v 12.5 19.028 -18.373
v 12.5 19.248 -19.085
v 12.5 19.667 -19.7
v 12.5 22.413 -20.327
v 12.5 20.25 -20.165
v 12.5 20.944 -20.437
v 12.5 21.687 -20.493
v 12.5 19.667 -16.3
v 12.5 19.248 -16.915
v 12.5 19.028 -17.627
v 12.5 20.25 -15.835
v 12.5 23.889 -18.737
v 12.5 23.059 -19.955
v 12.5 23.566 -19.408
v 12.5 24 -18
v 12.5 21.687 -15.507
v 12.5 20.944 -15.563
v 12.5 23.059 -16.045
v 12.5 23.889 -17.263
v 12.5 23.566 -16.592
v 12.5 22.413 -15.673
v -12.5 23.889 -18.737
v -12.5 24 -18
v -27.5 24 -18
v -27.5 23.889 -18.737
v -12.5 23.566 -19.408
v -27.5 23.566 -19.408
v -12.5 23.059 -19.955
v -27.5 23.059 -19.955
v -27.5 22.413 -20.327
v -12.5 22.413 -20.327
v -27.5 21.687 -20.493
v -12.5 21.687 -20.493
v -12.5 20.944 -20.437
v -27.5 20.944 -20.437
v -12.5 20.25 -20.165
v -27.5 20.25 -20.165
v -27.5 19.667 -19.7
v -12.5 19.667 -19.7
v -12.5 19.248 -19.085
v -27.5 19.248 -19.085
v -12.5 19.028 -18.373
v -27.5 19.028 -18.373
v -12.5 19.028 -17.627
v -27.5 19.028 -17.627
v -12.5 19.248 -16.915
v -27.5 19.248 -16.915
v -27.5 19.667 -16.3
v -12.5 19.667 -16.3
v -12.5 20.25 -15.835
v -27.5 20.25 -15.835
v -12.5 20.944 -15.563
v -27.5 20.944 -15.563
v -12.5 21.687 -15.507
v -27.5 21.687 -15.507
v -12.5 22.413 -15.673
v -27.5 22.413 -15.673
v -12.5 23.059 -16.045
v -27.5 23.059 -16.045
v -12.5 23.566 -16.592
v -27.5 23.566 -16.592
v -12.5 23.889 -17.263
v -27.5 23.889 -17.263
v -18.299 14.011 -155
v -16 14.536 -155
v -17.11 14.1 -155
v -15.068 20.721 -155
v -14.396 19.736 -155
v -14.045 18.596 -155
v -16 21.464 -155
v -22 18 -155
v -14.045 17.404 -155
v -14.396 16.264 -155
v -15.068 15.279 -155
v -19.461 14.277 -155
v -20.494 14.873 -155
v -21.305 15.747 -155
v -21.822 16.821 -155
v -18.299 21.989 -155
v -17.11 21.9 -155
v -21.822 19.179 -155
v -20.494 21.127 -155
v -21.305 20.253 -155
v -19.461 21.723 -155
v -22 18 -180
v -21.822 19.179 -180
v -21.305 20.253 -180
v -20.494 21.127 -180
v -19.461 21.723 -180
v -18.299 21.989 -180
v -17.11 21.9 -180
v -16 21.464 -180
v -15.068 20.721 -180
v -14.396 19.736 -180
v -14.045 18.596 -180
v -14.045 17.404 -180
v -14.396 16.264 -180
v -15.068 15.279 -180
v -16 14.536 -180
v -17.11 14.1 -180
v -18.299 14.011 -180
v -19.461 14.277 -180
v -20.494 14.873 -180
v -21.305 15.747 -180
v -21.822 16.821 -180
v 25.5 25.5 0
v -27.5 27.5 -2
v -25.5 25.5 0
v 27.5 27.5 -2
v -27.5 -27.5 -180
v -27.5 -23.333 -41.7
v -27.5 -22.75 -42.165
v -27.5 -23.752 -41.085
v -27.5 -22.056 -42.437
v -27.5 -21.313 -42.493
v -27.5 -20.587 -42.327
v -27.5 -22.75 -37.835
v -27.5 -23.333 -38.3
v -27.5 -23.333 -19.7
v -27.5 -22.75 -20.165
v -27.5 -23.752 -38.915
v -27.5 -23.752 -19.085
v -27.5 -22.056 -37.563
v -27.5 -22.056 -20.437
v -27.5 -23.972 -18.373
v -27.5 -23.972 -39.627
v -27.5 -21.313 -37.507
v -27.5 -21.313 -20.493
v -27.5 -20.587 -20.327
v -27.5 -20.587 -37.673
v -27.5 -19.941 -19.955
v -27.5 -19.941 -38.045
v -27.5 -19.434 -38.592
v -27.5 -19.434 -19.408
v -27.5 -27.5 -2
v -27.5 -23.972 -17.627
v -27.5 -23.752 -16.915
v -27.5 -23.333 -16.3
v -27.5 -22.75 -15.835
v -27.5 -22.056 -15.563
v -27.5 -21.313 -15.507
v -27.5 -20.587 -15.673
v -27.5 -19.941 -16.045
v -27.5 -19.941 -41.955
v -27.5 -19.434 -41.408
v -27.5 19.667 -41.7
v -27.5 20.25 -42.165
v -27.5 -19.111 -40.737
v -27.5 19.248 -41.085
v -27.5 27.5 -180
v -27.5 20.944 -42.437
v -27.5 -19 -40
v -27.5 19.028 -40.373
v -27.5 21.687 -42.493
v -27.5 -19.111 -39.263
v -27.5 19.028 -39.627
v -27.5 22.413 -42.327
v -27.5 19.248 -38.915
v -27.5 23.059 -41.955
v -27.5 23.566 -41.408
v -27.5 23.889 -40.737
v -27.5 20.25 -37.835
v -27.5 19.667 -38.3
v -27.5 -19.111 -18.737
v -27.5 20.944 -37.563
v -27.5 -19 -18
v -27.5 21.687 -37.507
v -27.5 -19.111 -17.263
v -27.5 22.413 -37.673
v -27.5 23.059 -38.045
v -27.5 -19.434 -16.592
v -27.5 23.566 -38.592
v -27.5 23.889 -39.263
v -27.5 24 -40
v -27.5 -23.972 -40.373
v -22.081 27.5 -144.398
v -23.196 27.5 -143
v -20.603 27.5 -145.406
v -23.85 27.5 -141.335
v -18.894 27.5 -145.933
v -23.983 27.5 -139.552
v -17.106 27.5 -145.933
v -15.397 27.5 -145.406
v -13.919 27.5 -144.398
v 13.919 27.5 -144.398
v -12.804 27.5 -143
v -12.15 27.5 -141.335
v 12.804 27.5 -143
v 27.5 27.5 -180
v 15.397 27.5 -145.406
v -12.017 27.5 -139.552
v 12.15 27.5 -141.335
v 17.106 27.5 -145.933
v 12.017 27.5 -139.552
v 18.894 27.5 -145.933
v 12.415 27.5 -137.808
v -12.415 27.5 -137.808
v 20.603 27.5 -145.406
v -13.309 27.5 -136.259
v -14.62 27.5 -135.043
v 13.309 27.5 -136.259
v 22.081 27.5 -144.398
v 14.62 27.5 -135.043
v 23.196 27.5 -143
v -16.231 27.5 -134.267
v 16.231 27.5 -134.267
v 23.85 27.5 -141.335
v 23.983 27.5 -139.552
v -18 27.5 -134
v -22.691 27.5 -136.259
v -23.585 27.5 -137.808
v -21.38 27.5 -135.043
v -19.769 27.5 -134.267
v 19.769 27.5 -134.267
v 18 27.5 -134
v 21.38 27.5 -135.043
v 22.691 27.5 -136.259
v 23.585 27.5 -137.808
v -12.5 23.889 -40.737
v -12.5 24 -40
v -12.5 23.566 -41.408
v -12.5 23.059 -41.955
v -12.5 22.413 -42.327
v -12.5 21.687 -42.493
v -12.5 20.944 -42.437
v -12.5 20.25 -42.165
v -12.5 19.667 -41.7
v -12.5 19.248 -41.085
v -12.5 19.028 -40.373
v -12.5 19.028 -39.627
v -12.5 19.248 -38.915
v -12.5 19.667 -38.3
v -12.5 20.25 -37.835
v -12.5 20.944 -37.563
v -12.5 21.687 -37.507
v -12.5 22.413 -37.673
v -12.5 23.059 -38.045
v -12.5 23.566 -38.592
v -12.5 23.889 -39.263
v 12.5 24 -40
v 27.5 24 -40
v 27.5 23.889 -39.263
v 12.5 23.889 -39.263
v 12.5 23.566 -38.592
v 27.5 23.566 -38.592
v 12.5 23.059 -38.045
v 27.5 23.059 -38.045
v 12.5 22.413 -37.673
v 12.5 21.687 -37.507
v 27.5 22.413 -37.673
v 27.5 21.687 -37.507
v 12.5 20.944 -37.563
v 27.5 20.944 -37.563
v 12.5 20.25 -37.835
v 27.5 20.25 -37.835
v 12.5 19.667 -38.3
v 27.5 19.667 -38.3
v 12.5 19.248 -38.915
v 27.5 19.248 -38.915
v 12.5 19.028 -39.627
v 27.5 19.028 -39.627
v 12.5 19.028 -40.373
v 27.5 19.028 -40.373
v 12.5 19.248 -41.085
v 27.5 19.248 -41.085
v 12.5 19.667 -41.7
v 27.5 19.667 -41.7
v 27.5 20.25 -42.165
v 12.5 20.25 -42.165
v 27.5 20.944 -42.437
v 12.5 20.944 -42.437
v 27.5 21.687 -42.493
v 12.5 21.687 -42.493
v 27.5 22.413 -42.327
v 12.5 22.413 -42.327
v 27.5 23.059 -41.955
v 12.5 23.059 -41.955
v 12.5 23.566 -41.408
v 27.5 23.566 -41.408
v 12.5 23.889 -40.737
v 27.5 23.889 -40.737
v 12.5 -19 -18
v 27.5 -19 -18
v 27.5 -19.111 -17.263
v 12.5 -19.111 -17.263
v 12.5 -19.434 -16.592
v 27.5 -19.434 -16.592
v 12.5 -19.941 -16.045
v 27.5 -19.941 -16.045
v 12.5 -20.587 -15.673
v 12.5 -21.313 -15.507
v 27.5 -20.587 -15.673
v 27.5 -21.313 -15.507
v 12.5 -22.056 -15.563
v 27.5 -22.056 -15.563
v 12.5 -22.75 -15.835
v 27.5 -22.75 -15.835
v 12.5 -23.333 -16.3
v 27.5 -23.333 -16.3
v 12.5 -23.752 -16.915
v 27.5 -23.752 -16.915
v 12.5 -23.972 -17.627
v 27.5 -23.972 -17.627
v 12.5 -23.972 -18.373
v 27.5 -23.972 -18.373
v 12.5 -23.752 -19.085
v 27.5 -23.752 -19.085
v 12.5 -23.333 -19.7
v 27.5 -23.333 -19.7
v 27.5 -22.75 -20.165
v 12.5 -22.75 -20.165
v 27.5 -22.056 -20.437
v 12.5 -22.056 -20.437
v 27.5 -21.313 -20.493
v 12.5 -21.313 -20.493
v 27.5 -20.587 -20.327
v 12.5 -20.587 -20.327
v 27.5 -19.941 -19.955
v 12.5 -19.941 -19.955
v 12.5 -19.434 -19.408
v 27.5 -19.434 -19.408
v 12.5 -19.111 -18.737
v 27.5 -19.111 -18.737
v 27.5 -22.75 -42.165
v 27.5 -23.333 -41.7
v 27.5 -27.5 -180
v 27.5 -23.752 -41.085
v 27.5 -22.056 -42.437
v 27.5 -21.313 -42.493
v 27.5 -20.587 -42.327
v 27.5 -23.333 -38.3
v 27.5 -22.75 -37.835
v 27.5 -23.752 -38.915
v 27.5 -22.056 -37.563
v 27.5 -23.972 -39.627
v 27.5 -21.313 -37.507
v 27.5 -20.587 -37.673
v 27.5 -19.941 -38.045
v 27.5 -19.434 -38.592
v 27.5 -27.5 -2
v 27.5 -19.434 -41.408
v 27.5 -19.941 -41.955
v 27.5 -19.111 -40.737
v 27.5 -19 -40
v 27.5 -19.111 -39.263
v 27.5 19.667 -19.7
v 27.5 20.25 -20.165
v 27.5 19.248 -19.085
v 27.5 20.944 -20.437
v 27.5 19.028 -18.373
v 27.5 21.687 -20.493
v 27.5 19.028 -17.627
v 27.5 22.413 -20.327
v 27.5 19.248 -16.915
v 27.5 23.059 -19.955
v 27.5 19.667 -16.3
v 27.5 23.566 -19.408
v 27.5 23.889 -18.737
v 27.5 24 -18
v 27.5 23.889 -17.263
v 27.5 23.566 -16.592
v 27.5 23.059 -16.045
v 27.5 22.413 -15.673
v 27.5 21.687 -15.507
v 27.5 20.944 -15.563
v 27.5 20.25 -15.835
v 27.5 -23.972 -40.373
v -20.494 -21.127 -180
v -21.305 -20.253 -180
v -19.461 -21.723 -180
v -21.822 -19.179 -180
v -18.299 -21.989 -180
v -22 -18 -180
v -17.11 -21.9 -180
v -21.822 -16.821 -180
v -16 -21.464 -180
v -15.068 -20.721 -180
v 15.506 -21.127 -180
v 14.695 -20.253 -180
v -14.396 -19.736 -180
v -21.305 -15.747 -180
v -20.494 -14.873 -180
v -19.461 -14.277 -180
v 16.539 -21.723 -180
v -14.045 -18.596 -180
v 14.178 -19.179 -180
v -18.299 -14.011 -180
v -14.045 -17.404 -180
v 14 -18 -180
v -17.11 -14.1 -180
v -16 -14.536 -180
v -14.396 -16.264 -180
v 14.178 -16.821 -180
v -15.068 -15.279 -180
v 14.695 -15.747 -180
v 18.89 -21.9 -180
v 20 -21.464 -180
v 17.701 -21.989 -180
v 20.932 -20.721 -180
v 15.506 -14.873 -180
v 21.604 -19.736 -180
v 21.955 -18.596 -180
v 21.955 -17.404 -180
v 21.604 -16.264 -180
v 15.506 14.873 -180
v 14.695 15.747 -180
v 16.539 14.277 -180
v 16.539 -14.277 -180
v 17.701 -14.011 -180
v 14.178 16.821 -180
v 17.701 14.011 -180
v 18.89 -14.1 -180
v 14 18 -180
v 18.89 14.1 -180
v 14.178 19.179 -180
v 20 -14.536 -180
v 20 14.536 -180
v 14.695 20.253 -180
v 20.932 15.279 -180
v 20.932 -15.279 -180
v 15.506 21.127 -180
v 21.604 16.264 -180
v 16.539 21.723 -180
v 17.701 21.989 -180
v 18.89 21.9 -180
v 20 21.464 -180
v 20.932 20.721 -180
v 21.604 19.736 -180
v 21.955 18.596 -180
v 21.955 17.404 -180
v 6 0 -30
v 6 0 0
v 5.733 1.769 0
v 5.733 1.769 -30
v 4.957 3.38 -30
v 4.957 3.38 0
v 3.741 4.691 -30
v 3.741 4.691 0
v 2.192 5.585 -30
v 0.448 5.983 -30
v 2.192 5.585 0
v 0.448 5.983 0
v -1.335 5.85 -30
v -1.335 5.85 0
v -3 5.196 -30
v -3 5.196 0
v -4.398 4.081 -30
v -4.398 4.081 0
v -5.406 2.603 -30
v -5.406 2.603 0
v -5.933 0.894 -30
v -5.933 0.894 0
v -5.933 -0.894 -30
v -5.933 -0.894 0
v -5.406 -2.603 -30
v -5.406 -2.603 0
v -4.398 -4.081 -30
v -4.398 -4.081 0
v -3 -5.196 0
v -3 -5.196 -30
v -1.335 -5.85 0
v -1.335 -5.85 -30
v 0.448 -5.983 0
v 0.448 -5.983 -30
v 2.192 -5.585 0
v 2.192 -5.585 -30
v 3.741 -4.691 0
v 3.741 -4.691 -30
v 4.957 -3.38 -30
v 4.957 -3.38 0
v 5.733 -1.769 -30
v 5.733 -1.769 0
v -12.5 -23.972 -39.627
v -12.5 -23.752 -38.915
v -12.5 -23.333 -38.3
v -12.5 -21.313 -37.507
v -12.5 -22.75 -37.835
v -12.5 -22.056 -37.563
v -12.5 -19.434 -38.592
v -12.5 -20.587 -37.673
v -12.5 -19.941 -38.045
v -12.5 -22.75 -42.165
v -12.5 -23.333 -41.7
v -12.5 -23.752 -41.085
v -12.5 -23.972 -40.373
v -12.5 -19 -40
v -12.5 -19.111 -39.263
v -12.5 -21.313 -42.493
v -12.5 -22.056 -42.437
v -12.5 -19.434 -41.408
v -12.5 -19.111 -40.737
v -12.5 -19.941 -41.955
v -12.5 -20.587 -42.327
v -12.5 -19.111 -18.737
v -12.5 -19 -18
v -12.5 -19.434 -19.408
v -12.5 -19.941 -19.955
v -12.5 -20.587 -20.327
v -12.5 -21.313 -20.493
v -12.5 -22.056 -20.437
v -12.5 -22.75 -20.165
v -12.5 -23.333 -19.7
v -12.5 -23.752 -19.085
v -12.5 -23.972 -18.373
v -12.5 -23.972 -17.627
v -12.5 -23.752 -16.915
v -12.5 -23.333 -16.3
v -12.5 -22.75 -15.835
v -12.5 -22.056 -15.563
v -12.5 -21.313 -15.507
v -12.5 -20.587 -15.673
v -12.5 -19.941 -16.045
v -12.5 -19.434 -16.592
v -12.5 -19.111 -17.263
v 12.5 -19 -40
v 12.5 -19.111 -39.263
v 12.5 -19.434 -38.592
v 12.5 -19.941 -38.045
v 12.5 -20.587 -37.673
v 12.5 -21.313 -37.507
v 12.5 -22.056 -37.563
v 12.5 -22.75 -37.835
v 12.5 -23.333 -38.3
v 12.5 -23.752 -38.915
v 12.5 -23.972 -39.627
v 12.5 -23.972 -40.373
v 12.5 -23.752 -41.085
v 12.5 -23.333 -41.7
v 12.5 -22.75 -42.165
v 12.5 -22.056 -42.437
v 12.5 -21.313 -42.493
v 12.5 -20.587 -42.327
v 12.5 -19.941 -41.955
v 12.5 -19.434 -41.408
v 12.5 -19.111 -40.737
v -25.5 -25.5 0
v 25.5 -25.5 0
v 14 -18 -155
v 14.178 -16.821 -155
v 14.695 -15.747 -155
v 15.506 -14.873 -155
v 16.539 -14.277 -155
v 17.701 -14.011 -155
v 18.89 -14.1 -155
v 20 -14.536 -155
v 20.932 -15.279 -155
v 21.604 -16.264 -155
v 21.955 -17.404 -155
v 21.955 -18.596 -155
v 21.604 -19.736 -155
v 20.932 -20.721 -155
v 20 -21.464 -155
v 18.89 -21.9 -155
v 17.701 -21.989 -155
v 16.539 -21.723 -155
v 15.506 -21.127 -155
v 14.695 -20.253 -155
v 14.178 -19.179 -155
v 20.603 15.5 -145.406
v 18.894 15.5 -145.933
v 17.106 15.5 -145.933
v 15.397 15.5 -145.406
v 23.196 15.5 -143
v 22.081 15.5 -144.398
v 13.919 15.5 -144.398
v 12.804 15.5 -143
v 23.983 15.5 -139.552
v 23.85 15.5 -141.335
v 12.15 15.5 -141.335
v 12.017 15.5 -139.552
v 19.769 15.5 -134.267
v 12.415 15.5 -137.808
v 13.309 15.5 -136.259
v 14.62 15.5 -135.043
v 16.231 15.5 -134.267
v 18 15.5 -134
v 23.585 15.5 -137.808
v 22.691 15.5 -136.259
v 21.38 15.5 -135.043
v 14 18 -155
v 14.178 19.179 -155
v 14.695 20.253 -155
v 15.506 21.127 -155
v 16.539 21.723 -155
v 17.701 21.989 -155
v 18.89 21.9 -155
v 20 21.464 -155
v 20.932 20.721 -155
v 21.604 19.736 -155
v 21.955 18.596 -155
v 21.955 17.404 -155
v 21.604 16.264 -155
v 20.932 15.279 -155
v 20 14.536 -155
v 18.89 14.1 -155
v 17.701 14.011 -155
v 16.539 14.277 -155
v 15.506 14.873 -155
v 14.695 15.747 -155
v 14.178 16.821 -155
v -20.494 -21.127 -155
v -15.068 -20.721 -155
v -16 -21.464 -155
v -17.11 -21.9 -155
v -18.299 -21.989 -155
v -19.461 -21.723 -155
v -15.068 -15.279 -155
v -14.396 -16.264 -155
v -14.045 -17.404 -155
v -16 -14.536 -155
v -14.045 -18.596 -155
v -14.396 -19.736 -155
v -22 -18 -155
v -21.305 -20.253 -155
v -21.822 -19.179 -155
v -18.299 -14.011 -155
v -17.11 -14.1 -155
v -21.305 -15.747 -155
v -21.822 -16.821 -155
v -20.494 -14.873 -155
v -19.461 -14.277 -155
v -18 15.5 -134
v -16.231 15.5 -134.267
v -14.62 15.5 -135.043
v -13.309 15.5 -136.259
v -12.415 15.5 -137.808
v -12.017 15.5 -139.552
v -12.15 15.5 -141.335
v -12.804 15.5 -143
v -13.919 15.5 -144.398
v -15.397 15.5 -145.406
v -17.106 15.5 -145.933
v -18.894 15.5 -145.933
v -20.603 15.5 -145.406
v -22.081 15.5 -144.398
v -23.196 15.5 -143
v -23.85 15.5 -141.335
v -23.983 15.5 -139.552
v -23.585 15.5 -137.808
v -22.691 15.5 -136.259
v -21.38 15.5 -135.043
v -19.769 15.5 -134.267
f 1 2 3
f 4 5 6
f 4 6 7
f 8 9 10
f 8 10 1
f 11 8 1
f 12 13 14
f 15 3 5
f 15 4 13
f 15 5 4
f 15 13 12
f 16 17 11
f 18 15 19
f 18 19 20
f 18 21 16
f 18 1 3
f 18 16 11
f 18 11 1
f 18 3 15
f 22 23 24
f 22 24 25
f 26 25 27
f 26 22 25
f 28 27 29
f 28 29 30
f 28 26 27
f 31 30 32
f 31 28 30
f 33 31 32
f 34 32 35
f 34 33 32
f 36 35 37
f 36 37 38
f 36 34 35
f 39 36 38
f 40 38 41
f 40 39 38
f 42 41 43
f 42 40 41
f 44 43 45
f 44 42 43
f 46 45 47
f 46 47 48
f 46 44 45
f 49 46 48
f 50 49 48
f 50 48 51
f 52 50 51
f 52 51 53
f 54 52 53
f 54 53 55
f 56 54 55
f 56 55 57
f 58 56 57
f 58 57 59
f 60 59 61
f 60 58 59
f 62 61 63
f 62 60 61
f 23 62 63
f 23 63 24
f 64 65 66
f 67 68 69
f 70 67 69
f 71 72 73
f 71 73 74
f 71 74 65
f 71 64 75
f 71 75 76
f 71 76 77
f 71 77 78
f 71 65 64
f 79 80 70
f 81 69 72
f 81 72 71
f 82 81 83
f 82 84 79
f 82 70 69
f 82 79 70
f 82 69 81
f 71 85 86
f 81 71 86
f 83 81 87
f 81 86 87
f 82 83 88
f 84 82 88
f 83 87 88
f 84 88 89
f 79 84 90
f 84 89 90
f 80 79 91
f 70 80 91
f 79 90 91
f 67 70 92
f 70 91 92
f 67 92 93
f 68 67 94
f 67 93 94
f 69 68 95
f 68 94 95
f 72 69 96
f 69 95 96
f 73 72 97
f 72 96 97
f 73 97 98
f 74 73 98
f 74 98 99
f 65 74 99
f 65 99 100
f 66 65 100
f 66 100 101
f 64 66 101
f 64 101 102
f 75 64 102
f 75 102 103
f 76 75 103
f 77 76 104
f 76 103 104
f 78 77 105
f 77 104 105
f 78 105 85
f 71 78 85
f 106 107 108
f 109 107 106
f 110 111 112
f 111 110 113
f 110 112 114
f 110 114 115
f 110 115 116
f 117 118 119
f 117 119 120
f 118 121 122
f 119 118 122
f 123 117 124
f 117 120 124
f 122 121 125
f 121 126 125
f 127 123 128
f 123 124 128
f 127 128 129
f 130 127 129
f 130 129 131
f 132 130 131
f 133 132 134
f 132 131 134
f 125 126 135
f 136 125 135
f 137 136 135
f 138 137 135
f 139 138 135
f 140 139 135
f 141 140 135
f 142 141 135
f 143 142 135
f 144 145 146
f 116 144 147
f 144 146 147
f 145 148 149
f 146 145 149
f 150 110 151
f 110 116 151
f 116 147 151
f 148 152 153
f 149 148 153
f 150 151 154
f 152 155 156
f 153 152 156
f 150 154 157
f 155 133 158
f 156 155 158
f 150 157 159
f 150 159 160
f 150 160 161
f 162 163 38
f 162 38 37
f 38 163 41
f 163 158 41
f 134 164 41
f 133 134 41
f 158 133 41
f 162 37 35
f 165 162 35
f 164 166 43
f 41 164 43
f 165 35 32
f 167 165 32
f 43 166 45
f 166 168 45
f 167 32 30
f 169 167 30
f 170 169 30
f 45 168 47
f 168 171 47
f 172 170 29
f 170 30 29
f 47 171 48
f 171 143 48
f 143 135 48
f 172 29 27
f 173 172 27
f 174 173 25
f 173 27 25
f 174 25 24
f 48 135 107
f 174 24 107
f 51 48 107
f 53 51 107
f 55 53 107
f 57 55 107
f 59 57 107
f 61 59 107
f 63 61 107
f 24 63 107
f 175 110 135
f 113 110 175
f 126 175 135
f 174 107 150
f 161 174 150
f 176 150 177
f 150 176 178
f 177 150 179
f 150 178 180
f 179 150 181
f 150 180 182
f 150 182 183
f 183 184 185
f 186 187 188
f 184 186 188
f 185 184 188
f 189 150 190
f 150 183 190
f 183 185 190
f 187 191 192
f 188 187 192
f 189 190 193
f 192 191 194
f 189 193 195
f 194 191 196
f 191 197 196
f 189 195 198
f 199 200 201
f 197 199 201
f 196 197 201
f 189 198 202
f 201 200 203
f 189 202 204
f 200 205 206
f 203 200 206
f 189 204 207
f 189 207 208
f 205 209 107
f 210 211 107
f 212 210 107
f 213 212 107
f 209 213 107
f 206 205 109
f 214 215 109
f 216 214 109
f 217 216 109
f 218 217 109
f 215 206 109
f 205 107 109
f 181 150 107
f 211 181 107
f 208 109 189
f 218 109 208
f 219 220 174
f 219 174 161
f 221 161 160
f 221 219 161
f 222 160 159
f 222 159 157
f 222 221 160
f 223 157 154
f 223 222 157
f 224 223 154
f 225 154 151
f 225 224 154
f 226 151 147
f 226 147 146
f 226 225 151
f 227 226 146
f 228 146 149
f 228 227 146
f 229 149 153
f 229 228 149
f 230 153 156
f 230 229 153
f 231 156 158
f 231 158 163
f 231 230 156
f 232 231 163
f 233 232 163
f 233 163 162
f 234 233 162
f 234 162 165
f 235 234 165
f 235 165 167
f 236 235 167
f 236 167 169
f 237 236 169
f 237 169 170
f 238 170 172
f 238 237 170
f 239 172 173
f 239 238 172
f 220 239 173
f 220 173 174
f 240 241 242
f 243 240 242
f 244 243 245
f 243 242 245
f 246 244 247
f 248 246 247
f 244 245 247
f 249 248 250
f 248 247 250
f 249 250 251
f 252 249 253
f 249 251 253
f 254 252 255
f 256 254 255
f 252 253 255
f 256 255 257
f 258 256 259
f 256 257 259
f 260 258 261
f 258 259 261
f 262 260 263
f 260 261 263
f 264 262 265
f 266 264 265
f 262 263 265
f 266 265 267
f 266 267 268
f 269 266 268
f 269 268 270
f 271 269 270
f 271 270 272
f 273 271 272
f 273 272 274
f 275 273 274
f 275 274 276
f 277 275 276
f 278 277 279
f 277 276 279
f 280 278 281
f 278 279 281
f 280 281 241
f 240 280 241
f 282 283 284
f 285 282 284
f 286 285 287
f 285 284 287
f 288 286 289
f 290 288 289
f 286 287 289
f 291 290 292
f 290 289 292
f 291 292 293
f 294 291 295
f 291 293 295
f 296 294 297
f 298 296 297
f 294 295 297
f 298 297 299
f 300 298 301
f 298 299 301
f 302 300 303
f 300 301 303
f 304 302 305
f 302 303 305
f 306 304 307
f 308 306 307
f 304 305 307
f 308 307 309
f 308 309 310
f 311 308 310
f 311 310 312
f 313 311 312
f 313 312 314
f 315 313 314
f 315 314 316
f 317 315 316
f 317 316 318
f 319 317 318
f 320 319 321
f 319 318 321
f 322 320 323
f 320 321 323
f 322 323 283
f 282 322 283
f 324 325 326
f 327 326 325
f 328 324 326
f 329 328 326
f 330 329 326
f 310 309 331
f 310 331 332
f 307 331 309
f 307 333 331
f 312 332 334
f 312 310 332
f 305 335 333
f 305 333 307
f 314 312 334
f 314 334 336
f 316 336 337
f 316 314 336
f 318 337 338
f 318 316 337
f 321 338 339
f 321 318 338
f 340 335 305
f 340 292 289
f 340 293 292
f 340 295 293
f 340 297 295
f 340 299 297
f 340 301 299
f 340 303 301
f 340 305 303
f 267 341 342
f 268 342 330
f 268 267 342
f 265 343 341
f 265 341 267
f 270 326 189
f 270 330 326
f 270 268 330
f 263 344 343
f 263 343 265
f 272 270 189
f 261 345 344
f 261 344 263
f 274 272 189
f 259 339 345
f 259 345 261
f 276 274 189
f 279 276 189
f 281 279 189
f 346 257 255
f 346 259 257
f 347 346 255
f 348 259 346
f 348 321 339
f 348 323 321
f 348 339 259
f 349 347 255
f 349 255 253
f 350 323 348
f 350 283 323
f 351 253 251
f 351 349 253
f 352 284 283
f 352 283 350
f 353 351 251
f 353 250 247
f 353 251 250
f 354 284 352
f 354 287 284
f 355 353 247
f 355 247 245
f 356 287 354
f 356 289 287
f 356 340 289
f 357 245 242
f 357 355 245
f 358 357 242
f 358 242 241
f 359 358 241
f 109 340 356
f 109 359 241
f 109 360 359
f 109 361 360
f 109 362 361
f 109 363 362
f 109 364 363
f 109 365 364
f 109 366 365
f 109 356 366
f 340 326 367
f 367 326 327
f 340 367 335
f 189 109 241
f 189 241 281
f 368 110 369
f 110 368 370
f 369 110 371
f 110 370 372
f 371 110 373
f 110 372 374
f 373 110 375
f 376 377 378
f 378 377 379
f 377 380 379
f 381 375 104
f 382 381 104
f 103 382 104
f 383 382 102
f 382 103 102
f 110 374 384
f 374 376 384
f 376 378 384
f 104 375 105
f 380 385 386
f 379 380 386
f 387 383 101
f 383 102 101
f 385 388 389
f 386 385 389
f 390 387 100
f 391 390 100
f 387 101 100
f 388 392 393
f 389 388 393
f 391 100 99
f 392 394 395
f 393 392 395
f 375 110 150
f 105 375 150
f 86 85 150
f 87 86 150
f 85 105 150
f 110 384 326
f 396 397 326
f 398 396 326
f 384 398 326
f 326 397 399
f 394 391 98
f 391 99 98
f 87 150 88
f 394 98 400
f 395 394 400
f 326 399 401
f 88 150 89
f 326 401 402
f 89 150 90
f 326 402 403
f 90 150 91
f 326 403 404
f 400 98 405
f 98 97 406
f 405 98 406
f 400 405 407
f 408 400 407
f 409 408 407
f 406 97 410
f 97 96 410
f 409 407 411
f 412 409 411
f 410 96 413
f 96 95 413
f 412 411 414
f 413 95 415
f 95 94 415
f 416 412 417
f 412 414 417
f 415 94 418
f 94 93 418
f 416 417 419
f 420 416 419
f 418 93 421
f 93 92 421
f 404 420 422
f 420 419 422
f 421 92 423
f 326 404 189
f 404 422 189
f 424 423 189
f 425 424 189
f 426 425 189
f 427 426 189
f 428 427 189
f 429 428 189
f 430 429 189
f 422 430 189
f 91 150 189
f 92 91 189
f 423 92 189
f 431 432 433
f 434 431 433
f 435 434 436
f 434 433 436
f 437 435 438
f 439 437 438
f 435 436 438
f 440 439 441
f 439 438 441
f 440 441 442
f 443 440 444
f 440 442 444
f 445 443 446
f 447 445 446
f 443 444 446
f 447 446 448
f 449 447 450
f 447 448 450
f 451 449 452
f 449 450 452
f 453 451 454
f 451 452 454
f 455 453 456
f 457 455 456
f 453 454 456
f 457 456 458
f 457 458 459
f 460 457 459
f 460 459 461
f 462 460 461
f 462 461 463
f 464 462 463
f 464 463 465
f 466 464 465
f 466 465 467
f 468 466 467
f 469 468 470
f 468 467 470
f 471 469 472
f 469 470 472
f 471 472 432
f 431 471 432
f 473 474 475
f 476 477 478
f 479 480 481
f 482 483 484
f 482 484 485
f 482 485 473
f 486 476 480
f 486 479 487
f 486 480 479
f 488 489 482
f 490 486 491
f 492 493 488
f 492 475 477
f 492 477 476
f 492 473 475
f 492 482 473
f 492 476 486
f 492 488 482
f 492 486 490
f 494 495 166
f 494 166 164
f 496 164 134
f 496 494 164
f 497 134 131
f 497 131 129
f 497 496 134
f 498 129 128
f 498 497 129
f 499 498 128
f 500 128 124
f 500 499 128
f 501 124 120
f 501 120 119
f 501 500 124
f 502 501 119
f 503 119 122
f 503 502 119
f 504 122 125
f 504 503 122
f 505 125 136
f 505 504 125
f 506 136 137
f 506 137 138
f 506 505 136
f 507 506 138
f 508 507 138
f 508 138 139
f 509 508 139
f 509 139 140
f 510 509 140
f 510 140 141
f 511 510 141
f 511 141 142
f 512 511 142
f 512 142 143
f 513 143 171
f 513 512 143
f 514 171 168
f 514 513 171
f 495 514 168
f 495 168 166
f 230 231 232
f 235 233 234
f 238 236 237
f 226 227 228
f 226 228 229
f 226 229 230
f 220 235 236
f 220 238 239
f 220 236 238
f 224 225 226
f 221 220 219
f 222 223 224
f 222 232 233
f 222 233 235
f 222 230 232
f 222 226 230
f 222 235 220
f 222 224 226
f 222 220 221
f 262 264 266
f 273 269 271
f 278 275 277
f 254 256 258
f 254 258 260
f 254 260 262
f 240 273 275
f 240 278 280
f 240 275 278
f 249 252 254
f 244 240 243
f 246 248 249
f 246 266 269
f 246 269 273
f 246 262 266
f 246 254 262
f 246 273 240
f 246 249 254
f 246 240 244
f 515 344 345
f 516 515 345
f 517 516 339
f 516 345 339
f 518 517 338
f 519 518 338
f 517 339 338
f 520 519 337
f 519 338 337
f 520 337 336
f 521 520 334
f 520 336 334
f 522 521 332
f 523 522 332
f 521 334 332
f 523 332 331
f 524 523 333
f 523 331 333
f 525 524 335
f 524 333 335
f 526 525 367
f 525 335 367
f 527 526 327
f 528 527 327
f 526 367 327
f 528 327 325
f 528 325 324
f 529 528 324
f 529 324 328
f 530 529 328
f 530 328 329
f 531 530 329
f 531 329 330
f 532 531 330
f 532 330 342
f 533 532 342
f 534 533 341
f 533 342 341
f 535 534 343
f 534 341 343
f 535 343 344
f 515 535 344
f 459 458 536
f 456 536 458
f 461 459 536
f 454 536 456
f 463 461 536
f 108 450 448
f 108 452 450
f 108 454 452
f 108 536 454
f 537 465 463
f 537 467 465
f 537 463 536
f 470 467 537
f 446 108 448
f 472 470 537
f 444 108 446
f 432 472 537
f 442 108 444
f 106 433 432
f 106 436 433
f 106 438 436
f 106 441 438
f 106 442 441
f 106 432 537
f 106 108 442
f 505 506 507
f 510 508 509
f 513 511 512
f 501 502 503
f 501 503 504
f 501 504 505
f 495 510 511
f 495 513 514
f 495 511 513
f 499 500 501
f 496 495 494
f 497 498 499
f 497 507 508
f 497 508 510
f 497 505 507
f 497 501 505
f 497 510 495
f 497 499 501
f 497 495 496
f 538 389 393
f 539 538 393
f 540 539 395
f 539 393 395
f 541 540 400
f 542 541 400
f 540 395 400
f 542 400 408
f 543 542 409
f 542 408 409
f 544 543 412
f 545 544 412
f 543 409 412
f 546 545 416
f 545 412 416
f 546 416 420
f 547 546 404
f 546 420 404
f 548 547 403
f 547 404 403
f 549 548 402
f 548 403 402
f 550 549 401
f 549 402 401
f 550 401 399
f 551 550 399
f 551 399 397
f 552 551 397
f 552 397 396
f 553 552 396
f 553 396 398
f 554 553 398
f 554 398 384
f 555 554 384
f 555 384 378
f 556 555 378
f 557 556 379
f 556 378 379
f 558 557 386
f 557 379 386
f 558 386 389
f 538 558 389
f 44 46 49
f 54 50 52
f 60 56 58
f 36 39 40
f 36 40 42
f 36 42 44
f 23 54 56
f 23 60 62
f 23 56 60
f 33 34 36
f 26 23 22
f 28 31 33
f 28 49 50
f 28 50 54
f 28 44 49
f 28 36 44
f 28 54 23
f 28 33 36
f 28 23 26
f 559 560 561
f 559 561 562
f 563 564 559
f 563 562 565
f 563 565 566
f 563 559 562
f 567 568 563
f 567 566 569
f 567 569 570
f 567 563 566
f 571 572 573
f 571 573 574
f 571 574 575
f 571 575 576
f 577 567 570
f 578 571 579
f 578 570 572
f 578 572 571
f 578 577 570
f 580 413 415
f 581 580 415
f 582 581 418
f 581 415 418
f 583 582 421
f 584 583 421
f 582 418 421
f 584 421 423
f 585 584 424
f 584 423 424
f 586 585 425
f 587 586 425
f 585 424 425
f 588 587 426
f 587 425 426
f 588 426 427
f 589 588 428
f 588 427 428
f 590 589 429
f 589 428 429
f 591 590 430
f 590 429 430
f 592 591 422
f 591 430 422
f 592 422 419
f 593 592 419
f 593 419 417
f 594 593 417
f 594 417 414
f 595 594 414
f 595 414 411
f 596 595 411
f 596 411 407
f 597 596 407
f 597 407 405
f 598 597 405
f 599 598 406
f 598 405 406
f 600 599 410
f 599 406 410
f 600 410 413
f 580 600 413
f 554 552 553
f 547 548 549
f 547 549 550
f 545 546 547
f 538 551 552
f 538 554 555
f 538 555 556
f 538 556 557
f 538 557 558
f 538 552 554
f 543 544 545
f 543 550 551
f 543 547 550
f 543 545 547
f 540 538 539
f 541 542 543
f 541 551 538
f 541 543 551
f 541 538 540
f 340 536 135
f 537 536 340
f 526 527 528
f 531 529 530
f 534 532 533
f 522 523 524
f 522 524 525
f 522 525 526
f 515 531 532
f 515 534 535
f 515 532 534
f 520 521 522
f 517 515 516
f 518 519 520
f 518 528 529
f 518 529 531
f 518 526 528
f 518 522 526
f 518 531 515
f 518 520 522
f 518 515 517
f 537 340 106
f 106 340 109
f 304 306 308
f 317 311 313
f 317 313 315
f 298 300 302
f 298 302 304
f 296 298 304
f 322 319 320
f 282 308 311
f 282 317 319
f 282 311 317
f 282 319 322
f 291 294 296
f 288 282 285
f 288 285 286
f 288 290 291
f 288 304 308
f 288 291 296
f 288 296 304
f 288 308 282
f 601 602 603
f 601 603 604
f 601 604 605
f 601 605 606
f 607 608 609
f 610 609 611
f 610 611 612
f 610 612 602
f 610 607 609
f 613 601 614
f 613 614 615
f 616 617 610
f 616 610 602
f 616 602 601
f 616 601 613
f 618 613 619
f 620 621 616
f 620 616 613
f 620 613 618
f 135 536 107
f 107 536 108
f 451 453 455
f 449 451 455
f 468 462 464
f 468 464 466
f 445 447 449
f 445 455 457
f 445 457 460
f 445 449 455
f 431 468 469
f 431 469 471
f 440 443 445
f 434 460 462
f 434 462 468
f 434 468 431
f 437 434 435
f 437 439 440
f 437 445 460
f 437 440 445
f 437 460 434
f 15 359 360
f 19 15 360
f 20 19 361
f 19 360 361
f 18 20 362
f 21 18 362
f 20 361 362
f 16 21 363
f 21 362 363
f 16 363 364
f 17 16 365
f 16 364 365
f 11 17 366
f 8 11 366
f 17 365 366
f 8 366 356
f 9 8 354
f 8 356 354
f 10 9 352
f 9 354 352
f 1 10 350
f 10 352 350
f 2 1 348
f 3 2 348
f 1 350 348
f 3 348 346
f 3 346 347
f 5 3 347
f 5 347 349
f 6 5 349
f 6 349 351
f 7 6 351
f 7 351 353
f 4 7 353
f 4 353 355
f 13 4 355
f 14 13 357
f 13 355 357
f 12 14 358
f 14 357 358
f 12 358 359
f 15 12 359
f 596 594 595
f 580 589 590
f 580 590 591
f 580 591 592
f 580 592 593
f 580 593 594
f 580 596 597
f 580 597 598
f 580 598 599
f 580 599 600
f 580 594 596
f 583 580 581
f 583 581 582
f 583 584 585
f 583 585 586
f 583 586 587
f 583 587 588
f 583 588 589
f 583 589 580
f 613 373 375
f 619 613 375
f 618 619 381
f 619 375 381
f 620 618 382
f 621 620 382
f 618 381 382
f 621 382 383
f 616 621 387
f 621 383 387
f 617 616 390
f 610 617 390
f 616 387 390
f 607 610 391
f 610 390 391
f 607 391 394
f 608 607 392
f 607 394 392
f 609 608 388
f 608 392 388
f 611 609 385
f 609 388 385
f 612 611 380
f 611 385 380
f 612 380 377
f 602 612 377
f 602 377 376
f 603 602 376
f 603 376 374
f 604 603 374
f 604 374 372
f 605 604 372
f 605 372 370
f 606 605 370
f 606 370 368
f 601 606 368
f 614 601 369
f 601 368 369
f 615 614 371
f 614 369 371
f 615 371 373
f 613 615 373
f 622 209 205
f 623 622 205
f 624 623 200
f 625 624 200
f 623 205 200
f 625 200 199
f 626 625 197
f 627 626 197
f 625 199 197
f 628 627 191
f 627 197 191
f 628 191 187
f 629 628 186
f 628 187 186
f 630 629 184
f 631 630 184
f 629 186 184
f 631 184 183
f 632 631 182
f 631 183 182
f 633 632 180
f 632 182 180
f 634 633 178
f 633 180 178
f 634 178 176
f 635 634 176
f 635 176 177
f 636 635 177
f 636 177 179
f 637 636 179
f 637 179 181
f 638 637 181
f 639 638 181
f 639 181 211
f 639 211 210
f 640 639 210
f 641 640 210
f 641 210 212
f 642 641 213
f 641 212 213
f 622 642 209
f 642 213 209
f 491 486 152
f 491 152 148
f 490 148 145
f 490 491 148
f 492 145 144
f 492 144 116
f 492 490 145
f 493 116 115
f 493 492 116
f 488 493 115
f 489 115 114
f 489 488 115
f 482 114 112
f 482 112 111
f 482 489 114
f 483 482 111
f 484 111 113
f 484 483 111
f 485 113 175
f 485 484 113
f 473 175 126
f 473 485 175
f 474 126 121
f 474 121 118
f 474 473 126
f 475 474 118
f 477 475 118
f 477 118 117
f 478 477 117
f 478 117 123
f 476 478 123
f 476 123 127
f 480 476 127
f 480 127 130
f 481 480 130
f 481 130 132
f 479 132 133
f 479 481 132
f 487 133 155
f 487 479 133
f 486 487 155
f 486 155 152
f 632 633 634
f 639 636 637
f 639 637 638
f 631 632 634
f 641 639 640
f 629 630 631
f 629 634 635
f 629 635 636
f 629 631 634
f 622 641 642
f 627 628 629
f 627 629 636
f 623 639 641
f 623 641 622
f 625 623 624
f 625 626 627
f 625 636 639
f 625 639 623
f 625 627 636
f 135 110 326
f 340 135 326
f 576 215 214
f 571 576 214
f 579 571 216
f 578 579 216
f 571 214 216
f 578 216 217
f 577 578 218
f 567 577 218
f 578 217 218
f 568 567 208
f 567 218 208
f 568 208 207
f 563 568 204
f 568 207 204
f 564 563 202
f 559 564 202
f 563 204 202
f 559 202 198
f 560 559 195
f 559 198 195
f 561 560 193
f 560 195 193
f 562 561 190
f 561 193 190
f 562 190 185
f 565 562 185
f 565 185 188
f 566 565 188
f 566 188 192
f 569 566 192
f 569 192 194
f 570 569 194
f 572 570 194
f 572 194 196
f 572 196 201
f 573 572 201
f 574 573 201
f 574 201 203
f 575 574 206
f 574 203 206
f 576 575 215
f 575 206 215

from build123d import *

# Parameters (mm, degrees)
CROQUIS1_W              = 55
CROQUIS1_H              = 55
SALIENTE_EXTRUIR1_DEPTH = 180
CROQUIS2_R              = 6
CORTAR_EXTRUIR1_DEPTH   = 30
CROQUIS3_R              = 4
CORTAR_EXTRUIR2_DEPTH   = 25
CROQUIS4_R              = 2.5
CORTAR_EXTRUIR3_DEPTH   = 15
CORTAR_EXTRUIR4_START   = -15
CROQUIS5_R              = 2.5
CORTAR_EXTRUIR4_DEPTH   = 15
CROQUIS6_R              = 6
CORTAR_EXTRUIR5_DEPTH   = 12
CHAFL_N1_SIZE           = 2


with BuildPart() as part:
    # Croquis1 → Saliente-Extruir1 (new body)
    with BuildSketch(Plane.XY):
        Rectangle(CROQUIS1_W, CROQUIS1_H)
    extrude(amount=-SALIENTE_EXTRUIR1_DEPTH)

    # Croquis2 → Cortar-Extruir1 (cut)
    with BuildSketch(Plane.XY):
        Circle(CROQUIS2_R)
    extrude(amount=-CORTAR_EXTRUIR1_DEPTH, mode=Mode.SUBTRACT)

    # Croquis3 → Cortar-Extruir2 (cut)
    with BuildSketch(Plane(origin=(0, 0, -180), x_dir=(-1, 0, 0), z_dir=(0, 0, -1))):
        with Locations((18, 18)):
            Circle(CROQUIS3_R)
        with Locations((-18, 18)):
            Circle(CROQUIS3_R)
        with Locations((-18, -18)):
            Circle(CROQUIS3_R)
        with Locations((18, -18)):
            Circle(CROQUIS3_R)
    extrude(amount=-CORTAR_EXTRUIR2_DEPTH, mode=Mode.SUBTRACT)

    # Croquis4 → Cortar-Extruir3 (cut)
    with BuildSketch(Plane(origin=(27.5, 0, 0), x_dir=(0, 0, -1), z_dir=(1, 0, 0))):
        with Locations(Location((18, 21.5, 0), (0, 0, 90))):
            Circle(CROQUIS4_R)
        with Locations(Location((40, 21.5, 0), (0, 0, 90))):
            Circle(CROQUIS4_R)
        with Locations(Location((40, -21.5, 0), (0, 0, 90))):
            Circle(CROQUIS4_R)
        with Locations(Location((18, -21.5, 0), (0, 0, 90))):
            Circle(CROQUIS4_R)
    extrude(amount=-CORTAR_EXTRUIR3_DEPTH, mode=Mode.SUBTRACT)

    # Croquis5 → Cortar-Extruir4 (cut)
    with BuildSketch(Plane.ZY.offset(27.5).offset(CORTAR_EXTRUIR4_START)):
        with Locations(Location((-18, 21.5, 0), (0, 0, 90))):
            Circle(CROQUIS5_R)
        with Locations(Location((-40, 21.5, 0), (0, 0, 90))):
            Circle(CROQUIS5_R)
        with Locations(Location((-40, -21.5, 0), (0, 0, 90))):
            Circle(CROQUIS5_R)
        with Locations(Location((-18, -21.5, 0), (0, 0, 90))):
            Circle(CROQUIS5_R)
    extrude(amount=CORTAR_EXTRUIR4_DEPTH, mode=Mode.SUBTRACT)

    # Croquis6 → Cortar-Extruir5 (cut)
    with BuildSketch(Plane(origin=(0, 27.5, 0), x_dir=(1, 0, 0), z_dir=(0, 1, 0))):
        with Locations(Location((-18, 140, 0), (0, 0, 270))):
            Circle(CROQUIS6_R)
        with Locations(Location((18, 140, 0), (0, 0, 270))):
            Circle(CROQUIS6_R)
    extrude(amount=-CORTAR_EXTRUIR5_DEPTH, mode=Mode.SUBTRACT)

    # Chaflán1
    chafl_n1_edges = [part.edges().sort_by_distance(p)[0] for p in [
        (0, -27.5, 0),
        (-27.5, 0, 0),
        (0, 27.5, 0),
        (27.5, 0, 0),
    ]]
    chamfer(chafl_n1_edges, length=CHAFL_N1_SIZE)


solid = part.part
